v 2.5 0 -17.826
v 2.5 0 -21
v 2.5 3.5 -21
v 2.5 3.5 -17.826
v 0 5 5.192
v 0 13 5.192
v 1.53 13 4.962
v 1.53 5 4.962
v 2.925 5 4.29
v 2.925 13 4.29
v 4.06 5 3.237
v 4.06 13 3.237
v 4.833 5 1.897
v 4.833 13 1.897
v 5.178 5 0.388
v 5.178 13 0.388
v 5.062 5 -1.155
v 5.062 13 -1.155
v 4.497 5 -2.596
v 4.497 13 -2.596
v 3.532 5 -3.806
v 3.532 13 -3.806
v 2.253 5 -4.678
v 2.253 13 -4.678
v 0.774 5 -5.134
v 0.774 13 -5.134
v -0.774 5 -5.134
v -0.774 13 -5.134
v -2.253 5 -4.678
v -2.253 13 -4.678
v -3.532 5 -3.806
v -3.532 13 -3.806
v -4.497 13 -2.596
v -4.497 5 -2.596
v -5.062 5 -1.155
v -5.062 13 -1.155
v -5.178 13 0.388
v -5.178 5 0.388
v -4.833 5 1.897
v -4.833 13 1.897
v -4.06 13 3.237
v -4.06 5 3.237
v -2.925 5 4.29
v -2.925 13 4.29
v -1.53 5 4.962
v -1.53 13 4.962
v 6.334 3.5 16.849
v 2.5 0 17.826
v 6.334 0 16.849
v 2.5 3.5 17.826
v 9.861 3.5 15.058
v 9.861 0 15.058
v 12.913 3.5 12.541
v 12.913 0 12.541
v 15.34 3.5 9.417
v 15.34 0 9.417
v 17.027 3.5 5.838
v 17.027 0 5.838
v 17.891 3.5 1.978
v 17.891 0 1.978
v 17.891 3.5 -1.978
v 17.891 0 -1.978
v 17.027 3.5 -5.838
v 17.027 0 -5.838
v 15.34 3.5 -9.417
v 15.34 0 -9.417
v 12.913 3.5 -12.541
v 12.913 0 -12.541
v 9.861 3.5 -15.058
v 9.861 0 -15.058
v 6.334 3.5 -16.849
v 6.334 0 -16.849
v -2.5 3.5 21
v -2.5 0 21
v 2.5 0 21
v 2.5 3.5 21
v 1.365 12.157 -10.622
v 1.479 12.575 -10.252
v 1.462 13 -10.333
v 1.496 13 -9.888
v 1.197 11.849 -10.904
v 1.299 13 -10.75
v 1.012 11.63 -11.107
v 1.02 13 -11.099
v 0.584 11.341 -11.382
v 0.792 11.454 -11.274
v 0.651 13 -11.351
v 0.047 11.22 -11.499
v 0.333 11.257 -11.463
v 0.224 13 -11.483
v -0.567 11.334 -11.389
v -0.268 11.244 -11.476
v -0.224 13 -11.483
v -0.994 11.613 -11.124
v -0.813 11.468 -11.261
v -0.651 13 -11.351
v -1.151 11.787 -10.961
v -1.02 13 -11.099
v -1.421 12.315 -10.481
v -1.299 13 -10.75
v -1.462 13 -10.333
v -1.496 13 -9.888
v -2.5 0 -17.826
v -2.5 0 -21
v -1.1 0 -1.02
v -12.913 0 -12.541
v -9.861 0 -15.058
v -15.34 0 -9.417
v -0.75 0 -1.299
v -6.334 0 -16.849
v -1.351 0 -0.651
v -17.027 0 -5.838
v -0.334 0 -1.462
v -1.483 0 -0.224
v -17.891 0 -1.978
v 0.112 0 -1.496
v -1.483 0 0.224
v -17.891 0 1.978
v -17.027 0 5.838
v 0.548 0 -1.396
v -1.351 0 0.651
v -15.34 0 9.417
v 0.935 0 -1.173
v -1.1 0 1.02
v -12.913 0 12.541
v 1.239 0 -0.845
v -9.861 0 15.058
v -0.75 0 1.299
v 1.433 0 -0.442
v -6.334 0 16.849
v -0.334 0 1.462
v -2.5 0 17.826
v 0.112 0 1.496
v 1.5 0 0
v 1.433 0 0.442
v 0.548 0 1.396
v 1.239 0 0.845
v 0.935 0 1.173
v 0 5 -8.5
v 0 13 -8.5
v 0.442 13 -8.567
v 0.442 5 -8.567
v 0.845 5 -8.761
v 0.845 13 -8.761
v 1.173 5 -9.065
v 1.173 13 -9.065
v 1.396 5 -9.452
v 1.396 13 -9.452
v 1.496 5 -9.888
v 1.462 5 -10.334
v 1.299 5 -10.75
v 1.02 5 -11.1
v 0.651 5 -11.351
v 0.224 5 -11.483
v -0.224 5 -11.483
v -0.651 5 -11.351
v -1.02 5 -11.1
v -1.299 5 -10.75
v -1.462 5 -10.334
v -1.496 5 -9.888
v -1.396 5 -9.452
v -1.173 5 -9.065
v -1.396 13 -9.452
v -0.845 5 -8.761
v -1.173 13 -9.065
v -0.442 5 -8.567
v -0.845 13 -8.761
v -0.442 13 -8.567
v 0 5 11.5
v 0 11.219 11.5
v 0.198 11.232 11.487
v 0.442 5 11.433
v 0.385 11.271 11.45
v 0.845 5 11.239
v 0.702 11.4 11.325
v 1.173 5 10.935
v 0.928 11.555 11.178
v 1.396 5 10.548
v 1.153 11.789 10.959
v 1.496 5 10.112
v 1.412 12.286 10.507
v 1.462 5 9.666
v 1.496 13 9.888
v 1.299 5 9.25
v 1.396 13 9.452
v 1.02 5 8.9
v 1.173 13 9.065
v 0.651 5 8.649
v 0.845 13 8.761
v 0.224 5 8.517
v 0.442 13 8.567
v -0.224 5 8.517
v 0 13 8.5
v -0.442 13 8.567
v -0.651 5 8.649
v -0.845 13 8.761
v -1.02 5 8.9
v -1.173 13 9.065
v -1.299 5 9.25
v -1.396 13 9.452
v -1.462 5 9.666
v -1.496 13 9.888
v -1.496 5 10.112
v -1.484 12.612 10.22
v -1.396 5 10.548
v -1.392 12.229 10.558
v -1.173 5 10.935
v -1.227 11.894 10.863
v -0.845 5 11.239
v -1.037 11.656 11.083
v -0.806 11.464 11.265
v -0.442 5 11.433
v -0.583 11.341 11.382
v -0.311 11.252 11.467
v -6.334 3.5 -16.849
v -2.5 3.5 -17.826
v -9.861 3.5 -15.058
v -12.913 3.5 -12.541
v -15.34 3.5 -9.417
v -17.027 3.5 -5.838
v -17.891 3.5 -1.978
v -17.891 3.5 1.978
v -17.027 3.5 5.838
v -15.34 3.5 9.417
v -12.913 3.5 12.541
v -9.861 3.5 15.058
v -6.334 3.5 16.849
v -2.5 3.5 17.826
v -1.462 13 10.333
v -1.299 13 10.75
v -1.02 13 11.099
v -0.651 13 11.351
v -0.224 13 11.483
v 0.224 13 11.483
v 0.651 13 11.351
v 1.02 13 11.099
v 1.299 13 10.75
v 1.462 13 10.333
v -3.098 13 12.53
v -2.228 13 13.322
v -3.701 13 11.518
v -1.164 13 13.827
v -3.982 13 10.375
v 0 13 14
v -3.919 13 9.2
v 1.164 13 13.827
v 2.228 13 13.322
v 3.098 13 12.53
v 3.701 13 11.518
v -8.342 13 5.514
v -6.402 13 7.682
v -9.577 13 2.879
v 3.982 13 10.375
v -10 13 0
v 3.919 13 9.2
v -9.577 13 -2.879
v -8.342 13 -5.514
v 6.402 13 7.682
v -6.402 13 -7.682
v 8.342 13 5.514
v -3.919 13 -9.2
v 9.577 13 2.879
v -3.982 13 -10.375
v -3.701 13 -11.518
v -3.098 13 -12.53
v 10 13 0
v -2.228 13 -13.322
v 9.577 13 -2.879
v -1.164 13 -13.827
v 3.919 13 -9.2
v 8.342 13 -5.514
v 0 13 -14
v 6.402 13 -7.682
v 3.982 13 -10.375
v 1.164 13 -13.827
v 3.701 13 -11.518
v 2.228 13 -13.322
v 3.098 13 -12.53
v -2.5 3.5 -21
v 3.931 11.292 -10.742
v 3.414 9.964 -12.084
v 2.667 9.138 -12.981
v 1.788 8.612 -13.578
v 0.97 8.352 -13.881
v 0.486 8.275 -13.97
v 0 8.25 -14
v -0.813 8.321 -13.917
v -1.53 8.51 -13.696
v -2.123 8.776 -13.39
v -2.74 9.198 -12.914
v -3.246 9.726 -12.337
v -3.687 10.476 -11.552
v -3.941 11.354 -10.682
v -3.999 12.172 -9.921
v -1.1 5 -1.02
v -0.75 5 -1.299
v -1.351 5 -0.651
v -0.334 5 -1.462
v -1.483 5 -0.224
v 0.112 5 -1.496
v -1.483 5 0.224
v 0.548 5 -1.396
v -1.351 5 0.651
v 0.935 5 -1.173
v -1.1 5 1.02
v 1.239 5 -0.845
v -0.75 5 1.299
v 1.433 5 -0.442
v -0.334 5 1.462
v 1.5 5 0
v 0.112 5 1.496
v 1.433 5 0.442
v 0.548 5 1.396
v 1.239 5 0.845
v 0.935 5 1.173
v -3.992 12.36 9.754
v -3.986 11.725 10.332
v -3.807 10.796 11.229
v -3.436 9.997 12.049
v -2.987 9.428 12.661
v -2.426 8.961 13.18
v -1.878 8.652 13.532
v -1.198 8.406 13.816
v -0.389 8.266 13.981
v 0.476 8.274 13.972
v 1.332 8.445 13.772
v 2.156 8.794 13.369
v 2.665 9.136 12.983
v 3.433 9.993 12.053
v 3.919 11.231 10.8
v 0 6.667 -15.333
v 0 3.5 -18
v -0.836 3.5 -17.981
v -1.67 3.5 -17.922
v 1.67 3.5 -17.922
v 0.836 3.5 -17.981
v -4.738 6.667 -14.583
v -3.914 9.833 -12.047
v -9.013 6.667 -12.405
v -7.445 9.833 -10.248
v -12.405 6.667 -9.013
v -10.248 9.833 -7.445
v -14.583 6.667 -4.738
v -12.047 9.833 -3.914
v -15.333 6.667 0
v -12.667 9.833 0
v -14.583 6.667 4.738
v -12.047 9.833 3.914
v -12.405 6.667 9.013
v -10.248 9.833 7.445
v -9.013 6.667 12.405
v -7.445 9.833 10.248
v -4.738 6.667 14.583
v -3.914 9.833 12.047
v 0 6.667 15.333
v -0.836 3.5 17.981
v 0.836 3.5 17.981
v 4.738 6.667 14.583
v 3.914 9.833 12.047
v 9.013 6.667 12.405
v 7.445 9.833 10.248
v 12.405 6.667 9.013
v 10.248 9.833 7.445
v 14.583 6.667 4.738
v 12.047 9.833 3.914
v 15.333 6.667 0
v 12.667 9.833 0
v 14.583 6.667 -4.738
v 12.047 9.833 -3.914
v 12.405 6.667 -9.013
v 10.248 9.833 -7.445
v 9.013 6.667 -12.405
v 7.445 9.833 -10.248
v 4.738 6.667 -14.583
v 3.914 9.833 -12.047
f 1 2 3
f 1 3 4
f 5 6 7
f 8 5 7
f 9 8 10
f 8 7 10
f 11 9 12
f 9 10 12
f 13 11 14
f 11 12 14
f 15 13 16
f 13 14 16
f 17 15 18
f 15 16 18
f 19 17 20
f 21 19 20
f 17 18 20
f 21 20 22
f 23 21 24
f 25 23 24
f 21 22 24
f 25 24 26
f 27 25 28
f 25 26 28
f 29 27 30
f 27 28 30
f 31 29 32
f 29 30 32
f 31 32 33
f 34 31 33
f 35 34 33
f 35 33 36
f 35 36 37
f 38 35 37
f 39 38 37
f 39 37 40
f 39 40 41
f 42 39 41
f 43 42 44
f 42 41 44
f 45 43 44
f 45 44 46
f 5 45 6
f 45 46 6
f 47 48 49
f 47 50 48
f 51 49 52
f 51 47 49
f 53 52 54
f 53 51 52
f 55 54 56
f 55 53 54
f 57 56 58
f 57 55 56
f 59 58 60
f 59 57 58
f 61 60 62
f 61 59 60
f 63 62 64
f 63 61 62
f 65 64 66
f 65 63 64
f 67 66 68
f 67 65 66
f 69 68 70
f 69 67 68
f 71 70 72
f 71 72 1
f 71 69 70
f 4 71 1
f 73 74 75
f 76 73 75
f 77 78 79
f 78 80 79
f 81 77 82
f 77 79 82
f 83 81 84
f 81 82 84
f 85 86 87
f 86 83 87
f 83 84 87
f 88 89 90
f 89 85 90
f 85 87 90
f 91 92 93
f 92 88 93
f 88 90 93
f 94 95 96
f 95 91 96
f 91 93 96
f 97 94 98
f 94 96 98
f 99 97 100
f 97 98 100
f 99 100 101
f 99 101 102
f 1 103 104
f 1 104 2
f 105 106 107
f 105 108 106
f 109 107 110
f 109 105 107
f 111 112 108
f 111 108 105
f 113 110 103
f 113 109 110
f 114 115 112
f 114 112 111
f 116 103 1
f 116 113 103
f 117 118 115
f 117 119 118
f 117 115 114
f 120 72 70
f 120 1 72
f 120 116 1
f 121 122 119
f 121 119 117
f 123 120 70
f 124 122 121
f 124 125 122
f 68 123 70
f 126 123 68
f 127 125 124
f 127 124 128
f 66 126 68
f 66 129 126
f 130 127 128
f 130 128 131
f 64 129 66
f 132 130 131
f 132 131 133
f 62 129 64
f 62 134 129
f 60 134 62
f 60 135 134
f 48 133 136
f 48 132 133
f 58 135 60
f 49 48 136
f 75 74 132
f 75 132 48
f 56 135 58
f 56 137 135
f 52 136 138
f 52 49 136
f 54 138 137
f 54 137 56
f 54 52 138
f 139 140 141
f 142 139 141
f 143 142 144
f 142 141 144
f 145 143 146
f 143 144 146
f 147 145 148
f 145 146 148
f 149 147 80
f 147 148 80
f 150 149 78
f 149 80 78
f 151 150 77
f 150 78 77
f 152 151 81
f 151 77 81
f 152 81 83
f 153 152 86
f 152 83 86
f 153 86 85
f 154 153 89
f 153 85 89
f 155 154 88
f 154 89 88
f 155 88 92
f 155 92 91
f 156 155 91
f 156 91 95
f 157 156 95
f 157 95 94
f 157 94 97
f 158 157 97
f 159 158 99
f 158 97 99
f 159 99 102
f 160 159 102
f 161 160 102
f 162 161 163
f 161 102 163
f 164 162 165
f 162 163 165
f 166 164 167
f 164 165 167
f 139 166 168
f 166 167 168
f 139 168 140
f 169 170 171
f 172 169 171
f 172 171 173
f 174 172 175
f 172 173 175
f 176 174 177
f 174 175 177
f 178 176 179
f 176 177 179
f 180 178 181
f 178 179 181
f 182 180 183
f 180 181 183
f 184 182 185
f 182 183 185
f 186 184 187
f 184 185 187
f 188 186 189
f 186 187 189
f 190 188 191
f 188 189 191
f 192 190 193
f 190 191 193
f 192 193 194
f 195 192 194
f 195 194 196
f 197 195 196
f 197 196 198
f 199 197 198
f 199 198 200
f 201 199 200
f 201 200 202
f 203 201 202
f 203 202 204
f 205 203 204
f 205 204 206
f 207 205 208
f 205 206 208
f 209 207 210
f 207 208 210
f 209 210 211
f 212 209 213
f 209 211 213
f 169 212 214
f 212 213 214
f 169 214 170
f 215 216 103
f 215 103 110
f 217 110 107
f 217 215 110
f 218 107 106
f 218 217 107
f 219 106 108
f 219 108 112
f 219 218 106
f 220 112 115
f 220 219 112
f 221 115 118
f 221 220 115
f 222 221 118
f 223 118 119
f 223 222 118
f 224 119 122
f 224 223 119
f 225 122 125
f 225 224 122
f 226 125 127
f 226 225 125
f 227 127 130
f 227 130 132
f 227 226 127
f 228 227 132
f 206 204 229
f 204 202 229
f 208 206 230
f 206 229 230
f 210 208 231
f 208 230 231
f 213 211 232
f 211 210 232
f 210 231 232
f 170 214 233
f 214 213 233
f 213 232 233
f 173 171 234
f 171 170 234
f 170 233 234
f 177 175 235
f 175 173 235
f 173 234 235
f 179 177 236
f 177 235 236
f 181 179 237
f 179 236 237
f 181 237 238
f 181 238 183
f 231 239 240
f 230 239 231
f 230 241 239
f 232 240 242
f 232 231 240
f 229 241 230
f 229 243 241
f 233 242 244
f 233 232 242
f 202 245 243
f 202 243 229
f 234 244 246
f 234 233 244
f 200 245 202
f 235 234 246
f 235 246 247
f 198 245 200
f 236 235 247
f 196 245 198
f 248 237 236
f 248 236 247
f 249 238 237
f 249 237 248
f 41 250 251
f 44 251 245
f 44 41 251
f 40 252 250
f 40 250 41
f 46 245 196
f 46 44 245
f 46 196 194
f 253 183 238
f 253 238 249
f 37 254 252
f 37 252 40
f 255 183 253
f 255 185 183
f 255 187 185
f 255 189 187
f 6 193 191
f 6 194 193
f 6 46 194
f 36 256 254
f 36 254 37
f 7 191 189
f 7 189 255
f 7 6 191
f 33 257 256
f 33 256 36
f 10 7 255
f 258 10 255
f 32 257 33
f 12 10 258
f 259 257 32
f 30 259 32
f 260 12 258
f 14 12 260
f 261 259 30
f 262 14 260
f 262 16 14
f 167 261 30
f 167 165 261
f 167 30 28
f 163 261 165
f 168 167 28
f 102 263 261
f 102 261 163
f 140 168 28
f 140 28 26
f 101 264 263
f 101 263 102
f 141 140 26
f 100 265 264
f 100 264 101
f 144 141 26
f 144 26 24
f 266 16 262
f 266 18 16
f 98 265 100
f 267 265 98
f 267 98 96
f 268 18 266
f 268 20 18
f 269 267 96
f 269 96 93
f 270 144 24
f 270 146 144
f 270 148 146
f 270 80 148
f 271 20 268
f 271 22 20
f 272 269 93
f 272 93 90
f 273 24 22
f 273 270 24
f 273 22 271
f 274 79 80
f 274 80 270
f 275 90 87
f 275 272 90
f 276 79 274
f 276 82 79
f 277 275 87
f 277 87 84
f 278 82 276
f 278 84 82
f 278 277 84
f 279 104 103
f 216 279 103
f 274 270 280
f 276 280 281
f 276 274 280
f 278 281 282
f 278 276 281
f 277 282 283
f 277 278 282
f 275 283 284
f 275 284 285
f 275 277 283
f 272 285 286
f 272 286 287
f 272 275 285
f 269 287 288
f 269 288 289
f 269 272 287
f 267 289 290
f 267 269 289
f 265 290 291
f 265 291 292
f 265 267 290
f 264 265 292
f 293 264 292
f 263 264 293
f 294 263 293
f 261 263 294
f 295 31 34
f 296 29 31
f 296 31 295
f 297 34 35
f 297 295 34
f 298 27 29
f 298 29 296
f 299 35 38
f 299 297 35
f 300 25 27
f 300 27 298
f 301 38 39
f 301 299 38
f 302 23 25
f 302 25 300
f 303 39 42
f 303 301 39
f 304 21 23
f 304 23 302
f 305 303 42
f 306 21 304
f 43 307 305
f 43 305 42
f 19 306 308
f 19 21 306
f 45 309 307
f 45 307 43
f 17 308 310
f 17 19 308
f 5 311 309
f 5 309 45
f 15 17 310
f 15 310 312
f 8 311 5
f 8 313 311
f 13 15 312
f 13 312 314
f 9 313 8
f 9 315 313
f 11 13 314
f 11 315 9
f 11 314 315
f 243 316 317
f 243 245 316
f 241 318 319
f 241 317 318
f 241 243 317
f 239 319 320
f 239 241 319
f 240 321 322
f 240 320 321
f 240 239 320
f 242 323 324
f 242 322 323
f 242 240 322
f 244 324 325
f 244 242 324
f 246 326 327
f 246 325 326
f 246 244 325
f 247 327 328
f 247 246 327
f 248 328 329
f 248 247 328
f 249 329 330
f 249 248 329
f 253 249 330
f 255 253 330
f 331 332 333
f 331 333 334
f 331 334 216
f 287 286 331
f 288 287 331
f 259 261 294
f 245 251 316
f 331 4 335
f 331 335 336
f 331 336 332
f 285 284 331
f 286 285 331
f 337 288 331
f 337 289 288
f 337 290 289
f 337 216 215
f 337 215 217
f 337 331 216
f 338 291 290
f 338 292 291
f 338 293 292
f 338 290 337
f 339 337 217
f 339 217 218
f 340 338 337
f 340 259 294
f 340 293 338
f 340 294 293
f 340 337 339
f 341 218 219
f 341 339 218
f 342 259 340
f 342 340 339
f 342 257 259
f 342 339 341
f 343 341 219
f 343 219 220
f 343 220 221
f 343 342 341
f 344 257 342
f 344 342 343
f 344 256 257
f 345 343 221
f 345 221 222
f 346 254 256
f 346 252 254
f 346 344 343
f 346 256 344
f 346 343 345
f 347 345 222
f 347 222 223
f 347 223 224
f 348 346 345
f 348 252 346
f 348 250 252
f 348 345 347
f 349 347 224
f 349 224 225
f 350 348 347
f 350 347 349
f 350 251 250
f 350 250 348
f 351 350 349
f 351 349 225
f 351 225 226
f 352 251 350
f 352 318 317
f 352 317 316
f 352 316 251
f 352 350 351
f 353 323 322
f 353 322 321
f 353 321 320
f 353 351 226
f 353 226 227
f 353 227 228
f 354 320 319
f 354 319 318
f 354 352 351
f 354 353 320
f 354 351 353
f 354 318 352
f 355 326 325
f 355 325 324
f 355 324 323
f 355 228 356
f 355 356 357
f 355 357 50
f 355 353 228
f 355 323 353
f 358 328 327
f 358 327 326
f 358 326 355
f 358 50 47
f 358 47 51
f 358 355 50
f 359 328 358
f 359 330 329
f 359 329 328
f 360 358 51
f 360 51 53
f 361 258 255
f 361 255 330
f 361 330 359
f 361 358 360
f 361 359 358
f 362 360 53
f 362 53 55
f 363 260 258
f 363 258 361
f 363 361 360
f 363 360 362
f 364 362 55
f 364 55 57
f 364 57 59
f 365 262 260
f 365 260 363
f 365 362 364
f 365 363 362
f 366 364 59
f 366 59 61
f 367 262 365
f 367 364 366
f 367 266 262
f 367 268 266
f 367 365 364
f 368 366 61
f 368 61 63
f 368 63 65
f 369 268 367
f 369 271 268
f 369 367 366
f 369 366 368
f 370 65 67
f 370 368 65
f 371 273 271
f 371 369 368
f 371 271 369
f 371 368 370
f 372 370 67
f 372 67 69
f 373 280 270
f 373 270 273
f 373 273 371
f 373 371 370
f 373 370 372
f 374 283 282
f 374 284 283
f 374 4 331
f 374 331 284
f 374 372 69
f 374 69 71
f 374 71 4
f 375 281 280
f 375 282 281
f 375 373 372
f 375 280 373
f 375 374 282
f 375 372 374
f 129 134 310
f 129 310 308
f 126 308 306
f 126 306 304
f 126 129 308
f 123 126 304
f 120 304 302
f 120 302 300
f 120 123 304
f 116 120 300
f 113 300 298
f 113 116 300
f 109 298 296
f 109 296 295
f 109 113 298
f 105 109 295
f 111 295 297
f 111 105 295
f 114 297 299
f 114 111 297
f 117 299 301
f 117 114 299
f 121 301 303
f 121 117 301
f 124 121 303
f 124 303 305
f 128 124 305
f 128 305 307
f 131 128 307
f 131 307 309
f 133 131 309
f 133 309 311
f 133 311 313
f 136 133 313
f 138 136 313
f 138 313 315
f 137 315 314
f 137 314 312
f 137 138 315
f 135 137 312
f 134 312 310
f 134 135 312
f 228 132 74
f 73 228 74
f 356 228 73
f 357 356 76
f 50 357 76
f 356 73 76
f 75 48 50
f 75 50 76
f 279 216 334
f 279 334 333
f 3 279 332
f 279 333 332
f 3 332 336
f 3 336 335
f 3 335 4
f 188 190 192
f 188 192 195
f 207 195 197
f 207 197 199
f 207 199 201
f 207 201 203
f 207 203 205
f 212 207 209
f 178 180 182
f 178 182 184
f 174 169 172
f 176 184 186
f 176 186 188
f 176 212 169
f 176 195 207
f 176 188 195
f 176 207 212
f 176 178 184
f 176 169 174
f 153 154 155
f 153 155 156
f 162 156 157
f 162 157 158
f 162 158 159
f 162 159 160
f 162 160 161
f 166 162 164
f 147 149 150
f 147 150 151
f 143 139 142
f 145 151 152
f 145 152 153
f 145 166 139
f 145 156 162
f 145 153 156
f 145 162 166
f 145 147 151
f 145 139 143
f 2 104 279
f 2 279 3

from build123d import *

# Parameters (mm, degrees)
CROQUIS2_R                  = 4
CROQUIS2_R_2                = 1.5
SALIENTE_EXTRUIR1_DEPTH     = 10
CROQUIS3_R                  = 5.192385193
CROQUIS3_R_2                = 1.5
CORTAR_EXTRUIR1_DEPTH       = 8
CROQUIS4_W                  = 5
CROQUIS4_H                  = 42
SALIENTE_EXTRUIR2_DEPTH     = 3.5
SALIENTE_EXTRUIR3_START     = -5
SALIENTE_EXTRUIR3_OUTLINE_R = 1.5
SALIENTE_EXTRUIR3_DEPTH     = 5


# Read off the part's stored shape, not the designer's step: Saliente-Extruir3
with BuildPart() as part:
    # Croquis1 → Revolución1 (revolve)
    with BuildSketch(Plane.XY, mode=Mode.PRIVATE) as revoluci_n1_sk:
        Polygon((0, 0), (18, 0), (18, 3.5), (10, 13), (0, 13), align=None)
    revolve(revoluci_n1_sk.sketch.rotate(Axis((0, 0, 0), (0, 1, 0)), 90), axis=Axis((0, 0, 0), (0, 1, 0)))

    # Croquis2 → Saliente-Extruir1 (add)
    # profile 1 of 2: a face of its own
    with BuildSketch(Plane(origin=(0, 13, 0), x_dir=(1, 0, 0), z_dir=(0, 1, 0))):
        with Locations((0, 10)):
            Circle(CROQUIS2_R)
        with Locations((0, 10)):
            Circle(CROQUIS2_R_2, mode=Mode.SUBTRACT)
    # profile 2 of 2: a face of its own
    with BuildSketch(Plane(origin=(0, 13, 0), x_dir=(1, 0, 0), z_dir=(0, 1, 0))):
        with Locations((0, -10)):
            Circle(CROQUIS2_R)
        with Locations((0, -10)):
            Circle(CROQUIS2_R_2, mode=Mode.SUBTRACT)
    extrude(amount=-SALIENTE_EXTRUIR1_DEPTH)

    # Croquis3 → Cortar-Extruir1 (cut)
    with BuildSketch(Plane(origin=(0, 13, 0), x_dir=(1, 0, 0), z_dir=(0, 1, 0))):
        with Locations(Location((0, 0, 0), (0, 0, 270))):
            Circle(CROQUIS3_R)
        with Locations(Location((0, 10, 0), (0, 0, 270))):
            Circle(CROQUIS3_R_2)
        with Locations(Location((0, -10, 0), (0, 0, 270))):
            Circle(CROQUIS3_R_2)
    extrude(amount=-CORTAR_EXTRUIR1_DEPTH, mode=Mode.SUBTRACT)

    # Croquis4 → Saliente-Extruir2 (add)
    with BuildSketch(Plane.XZ):
        Rectangle(CROQUIS4_W, CROQUIS4_H)
    extrude(amount=-SALIENTE_EXTRUIR2_DEPTH)

    # Saliente-Extruir3 outline → Saliente-Extruir3 (cut)
    with BuildSketch(Plane(origin=(0, 5, 0), x_dir=(1, 0, 0), z_dir=(0, 1, 0)).offset(SALIENTE_EXTRUIR3_START)):
        Circle(SALIENTE_EXTRUIR3_OUTLINE_R)
    extrude(amount=SALIENTE_EXTRUIR3_DEPTH, mode=Mode.SUBTRACT)


solid = part.part
